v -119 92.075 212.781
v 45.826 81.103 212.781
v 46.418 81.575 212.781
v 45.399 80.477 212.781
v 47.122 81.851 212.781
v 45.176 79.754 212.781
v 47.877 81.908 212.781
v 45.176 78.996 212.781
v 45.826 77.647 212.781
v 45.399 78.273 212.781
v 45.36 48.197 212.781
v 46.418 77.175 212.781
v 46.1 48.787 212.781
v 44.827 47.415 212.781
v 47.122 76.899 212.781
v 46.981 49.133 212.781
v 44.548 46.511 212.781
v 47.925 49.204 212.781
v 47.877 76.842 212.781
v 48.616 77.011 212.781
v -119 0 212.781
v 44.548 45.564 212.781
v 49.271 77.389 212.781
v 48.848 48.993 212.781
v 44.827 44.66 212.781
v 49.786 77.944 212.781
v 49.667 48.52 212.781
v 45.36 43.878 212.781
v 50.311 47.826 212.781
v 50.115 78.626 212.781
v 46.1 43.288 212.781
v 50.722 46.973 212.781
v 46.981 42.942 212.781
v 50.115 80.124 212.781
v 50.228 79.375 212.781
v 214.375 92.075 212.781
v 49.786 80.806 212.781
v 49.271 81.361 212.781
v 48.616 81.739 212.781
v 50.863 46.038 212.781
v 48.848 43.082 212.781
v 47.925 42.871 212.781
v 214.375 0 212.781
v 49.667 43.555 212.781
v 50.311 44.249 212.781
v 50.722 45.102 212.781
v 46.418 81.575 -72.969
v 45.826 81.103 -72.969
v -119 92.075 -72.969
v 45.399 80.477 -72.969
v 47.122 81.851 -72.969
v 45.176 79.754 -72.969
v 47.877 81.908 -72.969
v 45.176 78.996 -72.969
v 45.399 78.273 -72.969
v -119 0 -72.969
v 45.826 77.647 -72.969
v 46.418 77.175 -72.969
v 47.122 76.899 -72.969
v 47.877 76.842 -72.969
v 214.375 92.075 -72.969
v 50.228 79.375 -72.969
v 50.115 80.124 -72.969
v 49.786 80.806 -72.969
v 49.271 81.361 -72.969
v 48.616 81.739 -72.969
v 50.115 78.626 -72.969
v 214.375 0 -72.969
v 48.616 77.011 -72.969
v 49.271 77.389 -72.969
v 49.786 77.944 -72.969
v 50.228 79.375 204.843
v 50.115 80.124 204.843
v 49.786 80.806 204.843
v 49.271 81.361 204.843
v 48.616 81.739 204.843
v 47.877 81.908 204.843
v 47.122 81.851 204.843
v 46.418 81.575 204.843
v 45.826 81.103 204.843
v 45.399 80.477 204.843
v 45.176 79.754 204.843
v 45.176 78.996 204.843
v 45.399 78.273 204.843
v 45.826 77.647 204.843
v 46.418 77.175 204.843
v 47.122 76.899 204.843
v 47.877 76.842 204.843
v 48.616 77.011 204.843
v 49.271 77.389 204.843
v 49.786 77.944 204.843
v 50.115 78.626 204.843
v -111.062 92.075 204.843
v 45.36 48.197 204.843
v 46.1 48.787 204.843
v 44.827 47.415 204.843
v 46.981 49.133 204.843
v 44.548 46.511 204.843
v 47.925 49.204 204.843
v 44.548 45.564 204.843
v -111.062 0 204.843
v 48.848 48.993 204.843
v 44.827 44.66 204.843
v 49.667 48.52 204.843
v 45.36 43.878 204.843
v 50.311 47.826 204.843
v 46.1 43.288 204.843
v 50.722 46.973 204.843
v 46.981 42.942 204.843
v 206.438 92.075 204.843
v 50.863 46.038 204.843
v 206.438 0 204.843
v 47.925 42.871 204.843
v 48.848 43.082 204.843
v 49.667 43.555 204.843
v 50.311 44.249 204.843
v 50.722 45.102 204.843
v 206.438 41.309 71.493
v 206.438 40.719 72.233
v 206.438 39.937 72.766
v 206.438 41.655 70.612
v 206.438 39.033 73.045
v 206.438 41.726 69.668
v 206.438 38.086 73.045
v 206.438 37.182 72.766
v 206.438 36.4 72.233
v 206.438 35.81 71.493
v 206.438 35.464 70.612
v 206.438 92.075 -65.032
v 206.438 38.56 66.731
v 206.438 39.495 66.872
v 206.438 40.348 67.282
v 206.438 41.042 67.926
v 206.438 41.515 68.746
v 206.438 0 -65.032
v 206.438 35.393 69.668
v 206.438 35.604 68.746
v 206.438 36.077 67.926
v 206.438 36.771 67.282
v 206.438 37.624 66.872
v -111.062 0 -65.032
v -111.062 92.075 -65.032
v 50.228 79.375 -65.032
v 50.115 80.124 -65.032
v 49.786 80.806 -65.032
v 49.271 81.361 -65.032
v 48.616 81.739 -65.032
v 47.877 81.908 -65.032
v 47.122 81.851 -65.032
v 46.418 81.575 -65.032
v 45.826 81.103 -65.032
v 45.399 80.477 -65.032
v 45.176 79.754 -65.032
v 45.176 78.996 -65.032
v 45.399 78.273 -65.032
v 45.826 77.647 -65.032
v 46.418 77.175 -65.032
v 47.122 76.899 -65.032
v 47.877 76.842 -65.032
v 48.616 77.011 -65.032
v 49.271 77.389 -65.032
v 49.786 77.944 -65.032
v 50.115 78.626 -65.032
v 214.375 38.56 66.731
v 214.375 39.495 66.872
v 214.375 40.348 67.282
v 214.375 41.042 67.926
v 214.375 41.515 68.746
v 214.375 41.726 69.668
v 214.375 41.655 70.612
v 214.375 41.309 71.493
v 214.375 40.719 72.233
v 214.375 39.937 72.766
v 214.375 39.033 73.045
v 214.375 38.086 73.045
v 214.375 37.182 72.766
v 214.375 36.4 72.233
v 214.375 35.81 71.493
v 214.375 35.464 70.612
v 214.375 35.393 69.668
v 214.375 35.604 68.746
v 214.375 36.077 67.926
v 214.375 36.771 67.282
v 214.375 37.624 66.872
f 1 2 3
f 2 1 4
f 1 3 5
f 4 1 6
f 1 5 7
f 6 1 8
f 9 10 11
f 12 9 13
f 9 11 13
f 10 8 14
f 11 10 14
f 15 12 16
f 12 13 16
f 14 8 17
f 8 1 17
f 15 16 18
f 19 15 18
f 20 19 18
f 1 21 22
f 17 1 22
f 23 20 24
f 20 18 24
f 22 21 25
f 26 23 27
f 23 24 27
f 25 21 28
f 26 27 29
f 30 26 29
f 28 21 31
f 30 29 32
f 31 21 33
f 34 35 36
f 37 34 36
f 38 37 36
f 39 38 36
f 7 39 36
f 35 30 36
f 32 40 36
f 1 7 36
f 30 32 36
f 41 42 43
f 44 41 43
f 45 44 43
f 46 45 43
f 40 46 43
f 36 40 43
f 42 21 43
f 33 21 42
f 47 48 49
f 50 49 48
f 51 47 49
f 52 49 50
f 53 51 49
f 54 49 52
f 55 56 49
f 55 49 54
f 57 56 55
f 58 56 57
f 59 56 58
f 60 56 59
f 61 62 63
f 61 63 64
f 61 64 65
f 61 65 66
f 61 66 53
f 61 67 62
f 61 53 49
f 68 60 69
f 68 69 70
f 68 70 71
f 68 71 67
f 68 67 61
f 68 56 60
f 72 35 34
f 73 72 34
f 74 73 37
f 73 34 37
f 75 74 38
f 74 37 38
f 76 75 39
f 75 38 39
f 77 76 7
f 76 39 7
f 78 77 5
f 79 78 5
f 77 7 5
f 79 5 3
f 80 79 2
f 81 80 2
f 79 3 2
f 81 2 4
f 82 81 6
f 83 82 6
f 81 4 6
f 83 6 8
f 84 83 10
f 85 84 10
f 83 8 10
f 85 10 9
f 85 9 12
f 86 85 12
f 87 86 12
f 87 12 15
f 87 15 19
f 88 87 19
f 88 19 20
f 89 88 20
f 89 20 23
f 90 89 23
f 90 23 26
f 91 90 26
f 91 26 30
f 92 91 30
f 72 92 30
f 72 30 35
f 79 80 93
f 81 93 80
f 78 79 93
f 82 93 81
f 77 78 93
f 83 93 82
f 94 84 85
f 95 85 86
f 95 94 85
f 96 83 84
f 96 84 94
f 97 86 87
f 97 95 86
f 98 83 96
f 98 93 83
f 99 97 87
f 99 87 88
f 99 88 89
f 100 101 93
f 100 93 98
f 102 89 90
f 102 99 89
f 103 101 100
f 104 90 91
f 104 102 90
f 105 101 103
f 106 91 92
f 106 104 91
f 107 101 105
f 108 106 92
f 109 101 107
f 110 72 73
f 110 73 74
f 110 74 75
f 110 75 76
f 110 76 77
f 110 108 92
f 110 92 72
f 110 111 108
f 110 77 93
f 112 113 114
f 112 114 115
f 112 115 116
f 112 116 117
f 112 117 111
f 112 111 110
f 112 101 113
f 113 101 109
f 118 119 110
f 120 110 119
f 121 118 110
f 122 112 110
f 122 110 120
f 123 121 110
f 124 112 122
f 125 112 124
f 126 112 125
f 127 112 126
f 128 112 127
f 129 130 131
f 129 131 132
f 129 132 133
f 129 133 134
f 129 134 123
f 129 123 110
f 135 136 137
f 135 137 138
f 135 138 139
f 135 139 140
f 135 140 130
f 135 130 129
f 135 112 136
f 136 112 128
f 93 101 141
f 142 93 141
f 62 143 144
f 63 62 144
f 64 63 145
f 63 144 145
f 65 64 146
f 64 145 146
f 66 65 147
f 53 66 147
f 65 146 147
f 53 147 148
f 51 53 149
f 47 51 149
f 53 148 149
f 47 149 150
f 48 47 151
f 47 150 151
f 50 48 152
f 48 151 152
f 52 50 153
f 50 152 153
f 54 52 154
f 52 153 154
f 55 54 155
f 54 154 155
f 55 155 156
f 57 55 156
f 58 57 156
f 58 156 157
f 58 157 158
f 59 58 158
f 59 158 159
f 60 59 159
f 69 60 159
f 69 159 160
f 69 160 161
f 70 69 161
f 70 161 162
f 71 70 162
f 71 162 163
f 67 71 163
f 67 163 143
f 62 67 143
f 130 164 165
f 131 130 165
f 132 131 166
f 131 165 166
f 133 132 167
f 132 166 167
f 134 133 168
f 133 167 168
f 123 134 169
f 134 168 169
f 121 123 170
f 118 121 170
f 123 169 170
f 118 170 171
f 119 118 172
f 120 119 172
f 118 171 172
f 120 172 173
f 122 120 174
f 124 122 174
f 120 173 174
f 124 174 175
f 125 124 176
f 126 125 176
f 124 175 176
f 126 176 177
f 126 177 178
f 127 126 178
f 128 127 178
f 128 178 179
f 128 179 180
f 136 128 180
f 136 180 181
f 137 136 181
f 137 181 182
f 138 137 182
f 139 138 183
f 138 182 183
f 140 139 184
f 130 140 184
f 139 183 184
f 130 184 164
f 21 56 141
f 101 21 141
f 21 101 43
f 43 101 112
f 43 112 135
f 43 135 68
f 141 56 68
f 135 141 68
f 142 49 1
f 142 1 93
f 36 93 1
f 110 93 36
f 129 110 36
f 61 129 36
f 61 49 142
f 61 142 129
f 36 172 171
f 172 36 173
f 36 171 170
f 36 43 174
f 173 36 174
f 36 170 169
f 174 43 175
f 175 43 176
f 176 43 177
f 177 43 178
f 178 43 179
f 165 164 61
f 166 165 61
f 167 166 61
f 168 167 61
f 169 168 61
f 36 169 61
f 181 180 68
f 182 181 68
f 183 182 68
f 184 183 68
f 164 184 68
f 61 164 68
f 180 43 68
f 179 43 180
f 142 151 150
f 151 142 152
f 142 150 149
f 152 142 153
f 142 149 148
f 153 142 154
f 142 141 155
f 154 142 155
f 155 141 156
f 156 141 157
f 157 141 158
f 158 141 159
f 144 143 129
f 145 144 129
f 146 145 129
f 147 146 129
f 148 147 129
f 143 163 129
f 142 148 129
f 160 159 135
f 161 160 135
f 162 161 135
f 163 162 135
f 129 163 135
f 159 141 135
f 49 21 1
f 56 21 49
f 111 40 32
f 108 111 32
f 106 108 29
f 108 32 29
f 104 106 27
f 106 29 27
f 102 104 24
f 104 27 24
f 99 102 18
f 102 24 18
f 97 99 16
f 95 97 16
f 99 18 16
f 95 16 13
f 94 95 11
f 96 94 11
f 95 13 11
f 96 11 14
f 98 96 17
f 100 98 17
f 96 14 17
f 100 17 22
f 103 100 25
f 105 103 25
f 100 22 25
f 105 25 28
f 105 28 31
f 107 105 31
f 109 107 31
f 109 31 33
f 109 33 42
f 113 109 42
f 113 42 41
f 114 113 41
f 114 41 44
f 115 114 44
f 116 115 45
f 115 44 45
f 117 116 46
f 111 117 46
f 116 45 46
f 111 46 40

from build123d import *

# Parameters (mm, degrees)
SKETCH1_W           = 333.375
SKETCH1_H           = 285.75
SKETCH1_W_2         = 317.5
SKETCH1_H_2         = 269.875
BOSS_EXTRUDE1_DEPTH = 92.075
SKETCH2_R           = 2.54
CUT_EXTRUDE1_DEPTH  = 369.90049146
SKETCH3_R           = 3.175
CUT_EXTRUDE2_DEPTH  = 7.9375
SKETCH4_R           = 3.175
CUT_EXTRUDE3_DEPTH  = 7.9375


with BuildPart() as part:
    # Sketch1 → Boss-Extrude1 (new body)
    with BuildSketch(Plane(origin=(0, 0, 0), x_dir=(1, 0, 0), z_dir=(0, 1, 0))):
        with Locations((47.68764892, -69.90555659)):
            Rectangle(SKETCH1_W, SKETCH1_H)
        with Locations((47.68764892, -69.90555659)):
            Rectangle(SKETCH1_W_2, SKETCH1_H_2, mode=Mode.SUBTRACT)
    extrude(amount=BOSS_EXTRUDE1_DEPTH)

    # Sketch2 → Cut-Extrude1 (cut, through all)
    with BuildSketch(Plane.XY.offset(212.78055659)):
        with Locations((47.68764892, 79.375)):
            Circle(SKETCH2_R)
    extrude(amount=-CUT_EXTRUDE1_DEPTH, mode=Mode.SUBTRACT)

    # Sketch3 → Cut-Extrude2 (cut)
    with BuildSketch(Plane.XY.offset(212.78055659)):
        with Locations((47.68764892, 46.0375)):
            Circle(SKETCH3_R)
    extrude(amount=-CUT_EXTRUDE2_DEPTH, mode=Mode.SUBTRACT)

    # Sketch4 → Cut-Extrude3 (cut)
    with BuildSketch(Plane(origin=(214.37514892, 0, 0), x_dir=(0, 0, -1), z_dir=(1, 0, 0))):
        with Locations((-69.90555659, 38.559584582)):
            Circle(SKETCH4_R)
    extrude(amount=-CUT_EXTRUDE3_DEPTH, mode=Mode.SUBTRACT)


solid = part.part
